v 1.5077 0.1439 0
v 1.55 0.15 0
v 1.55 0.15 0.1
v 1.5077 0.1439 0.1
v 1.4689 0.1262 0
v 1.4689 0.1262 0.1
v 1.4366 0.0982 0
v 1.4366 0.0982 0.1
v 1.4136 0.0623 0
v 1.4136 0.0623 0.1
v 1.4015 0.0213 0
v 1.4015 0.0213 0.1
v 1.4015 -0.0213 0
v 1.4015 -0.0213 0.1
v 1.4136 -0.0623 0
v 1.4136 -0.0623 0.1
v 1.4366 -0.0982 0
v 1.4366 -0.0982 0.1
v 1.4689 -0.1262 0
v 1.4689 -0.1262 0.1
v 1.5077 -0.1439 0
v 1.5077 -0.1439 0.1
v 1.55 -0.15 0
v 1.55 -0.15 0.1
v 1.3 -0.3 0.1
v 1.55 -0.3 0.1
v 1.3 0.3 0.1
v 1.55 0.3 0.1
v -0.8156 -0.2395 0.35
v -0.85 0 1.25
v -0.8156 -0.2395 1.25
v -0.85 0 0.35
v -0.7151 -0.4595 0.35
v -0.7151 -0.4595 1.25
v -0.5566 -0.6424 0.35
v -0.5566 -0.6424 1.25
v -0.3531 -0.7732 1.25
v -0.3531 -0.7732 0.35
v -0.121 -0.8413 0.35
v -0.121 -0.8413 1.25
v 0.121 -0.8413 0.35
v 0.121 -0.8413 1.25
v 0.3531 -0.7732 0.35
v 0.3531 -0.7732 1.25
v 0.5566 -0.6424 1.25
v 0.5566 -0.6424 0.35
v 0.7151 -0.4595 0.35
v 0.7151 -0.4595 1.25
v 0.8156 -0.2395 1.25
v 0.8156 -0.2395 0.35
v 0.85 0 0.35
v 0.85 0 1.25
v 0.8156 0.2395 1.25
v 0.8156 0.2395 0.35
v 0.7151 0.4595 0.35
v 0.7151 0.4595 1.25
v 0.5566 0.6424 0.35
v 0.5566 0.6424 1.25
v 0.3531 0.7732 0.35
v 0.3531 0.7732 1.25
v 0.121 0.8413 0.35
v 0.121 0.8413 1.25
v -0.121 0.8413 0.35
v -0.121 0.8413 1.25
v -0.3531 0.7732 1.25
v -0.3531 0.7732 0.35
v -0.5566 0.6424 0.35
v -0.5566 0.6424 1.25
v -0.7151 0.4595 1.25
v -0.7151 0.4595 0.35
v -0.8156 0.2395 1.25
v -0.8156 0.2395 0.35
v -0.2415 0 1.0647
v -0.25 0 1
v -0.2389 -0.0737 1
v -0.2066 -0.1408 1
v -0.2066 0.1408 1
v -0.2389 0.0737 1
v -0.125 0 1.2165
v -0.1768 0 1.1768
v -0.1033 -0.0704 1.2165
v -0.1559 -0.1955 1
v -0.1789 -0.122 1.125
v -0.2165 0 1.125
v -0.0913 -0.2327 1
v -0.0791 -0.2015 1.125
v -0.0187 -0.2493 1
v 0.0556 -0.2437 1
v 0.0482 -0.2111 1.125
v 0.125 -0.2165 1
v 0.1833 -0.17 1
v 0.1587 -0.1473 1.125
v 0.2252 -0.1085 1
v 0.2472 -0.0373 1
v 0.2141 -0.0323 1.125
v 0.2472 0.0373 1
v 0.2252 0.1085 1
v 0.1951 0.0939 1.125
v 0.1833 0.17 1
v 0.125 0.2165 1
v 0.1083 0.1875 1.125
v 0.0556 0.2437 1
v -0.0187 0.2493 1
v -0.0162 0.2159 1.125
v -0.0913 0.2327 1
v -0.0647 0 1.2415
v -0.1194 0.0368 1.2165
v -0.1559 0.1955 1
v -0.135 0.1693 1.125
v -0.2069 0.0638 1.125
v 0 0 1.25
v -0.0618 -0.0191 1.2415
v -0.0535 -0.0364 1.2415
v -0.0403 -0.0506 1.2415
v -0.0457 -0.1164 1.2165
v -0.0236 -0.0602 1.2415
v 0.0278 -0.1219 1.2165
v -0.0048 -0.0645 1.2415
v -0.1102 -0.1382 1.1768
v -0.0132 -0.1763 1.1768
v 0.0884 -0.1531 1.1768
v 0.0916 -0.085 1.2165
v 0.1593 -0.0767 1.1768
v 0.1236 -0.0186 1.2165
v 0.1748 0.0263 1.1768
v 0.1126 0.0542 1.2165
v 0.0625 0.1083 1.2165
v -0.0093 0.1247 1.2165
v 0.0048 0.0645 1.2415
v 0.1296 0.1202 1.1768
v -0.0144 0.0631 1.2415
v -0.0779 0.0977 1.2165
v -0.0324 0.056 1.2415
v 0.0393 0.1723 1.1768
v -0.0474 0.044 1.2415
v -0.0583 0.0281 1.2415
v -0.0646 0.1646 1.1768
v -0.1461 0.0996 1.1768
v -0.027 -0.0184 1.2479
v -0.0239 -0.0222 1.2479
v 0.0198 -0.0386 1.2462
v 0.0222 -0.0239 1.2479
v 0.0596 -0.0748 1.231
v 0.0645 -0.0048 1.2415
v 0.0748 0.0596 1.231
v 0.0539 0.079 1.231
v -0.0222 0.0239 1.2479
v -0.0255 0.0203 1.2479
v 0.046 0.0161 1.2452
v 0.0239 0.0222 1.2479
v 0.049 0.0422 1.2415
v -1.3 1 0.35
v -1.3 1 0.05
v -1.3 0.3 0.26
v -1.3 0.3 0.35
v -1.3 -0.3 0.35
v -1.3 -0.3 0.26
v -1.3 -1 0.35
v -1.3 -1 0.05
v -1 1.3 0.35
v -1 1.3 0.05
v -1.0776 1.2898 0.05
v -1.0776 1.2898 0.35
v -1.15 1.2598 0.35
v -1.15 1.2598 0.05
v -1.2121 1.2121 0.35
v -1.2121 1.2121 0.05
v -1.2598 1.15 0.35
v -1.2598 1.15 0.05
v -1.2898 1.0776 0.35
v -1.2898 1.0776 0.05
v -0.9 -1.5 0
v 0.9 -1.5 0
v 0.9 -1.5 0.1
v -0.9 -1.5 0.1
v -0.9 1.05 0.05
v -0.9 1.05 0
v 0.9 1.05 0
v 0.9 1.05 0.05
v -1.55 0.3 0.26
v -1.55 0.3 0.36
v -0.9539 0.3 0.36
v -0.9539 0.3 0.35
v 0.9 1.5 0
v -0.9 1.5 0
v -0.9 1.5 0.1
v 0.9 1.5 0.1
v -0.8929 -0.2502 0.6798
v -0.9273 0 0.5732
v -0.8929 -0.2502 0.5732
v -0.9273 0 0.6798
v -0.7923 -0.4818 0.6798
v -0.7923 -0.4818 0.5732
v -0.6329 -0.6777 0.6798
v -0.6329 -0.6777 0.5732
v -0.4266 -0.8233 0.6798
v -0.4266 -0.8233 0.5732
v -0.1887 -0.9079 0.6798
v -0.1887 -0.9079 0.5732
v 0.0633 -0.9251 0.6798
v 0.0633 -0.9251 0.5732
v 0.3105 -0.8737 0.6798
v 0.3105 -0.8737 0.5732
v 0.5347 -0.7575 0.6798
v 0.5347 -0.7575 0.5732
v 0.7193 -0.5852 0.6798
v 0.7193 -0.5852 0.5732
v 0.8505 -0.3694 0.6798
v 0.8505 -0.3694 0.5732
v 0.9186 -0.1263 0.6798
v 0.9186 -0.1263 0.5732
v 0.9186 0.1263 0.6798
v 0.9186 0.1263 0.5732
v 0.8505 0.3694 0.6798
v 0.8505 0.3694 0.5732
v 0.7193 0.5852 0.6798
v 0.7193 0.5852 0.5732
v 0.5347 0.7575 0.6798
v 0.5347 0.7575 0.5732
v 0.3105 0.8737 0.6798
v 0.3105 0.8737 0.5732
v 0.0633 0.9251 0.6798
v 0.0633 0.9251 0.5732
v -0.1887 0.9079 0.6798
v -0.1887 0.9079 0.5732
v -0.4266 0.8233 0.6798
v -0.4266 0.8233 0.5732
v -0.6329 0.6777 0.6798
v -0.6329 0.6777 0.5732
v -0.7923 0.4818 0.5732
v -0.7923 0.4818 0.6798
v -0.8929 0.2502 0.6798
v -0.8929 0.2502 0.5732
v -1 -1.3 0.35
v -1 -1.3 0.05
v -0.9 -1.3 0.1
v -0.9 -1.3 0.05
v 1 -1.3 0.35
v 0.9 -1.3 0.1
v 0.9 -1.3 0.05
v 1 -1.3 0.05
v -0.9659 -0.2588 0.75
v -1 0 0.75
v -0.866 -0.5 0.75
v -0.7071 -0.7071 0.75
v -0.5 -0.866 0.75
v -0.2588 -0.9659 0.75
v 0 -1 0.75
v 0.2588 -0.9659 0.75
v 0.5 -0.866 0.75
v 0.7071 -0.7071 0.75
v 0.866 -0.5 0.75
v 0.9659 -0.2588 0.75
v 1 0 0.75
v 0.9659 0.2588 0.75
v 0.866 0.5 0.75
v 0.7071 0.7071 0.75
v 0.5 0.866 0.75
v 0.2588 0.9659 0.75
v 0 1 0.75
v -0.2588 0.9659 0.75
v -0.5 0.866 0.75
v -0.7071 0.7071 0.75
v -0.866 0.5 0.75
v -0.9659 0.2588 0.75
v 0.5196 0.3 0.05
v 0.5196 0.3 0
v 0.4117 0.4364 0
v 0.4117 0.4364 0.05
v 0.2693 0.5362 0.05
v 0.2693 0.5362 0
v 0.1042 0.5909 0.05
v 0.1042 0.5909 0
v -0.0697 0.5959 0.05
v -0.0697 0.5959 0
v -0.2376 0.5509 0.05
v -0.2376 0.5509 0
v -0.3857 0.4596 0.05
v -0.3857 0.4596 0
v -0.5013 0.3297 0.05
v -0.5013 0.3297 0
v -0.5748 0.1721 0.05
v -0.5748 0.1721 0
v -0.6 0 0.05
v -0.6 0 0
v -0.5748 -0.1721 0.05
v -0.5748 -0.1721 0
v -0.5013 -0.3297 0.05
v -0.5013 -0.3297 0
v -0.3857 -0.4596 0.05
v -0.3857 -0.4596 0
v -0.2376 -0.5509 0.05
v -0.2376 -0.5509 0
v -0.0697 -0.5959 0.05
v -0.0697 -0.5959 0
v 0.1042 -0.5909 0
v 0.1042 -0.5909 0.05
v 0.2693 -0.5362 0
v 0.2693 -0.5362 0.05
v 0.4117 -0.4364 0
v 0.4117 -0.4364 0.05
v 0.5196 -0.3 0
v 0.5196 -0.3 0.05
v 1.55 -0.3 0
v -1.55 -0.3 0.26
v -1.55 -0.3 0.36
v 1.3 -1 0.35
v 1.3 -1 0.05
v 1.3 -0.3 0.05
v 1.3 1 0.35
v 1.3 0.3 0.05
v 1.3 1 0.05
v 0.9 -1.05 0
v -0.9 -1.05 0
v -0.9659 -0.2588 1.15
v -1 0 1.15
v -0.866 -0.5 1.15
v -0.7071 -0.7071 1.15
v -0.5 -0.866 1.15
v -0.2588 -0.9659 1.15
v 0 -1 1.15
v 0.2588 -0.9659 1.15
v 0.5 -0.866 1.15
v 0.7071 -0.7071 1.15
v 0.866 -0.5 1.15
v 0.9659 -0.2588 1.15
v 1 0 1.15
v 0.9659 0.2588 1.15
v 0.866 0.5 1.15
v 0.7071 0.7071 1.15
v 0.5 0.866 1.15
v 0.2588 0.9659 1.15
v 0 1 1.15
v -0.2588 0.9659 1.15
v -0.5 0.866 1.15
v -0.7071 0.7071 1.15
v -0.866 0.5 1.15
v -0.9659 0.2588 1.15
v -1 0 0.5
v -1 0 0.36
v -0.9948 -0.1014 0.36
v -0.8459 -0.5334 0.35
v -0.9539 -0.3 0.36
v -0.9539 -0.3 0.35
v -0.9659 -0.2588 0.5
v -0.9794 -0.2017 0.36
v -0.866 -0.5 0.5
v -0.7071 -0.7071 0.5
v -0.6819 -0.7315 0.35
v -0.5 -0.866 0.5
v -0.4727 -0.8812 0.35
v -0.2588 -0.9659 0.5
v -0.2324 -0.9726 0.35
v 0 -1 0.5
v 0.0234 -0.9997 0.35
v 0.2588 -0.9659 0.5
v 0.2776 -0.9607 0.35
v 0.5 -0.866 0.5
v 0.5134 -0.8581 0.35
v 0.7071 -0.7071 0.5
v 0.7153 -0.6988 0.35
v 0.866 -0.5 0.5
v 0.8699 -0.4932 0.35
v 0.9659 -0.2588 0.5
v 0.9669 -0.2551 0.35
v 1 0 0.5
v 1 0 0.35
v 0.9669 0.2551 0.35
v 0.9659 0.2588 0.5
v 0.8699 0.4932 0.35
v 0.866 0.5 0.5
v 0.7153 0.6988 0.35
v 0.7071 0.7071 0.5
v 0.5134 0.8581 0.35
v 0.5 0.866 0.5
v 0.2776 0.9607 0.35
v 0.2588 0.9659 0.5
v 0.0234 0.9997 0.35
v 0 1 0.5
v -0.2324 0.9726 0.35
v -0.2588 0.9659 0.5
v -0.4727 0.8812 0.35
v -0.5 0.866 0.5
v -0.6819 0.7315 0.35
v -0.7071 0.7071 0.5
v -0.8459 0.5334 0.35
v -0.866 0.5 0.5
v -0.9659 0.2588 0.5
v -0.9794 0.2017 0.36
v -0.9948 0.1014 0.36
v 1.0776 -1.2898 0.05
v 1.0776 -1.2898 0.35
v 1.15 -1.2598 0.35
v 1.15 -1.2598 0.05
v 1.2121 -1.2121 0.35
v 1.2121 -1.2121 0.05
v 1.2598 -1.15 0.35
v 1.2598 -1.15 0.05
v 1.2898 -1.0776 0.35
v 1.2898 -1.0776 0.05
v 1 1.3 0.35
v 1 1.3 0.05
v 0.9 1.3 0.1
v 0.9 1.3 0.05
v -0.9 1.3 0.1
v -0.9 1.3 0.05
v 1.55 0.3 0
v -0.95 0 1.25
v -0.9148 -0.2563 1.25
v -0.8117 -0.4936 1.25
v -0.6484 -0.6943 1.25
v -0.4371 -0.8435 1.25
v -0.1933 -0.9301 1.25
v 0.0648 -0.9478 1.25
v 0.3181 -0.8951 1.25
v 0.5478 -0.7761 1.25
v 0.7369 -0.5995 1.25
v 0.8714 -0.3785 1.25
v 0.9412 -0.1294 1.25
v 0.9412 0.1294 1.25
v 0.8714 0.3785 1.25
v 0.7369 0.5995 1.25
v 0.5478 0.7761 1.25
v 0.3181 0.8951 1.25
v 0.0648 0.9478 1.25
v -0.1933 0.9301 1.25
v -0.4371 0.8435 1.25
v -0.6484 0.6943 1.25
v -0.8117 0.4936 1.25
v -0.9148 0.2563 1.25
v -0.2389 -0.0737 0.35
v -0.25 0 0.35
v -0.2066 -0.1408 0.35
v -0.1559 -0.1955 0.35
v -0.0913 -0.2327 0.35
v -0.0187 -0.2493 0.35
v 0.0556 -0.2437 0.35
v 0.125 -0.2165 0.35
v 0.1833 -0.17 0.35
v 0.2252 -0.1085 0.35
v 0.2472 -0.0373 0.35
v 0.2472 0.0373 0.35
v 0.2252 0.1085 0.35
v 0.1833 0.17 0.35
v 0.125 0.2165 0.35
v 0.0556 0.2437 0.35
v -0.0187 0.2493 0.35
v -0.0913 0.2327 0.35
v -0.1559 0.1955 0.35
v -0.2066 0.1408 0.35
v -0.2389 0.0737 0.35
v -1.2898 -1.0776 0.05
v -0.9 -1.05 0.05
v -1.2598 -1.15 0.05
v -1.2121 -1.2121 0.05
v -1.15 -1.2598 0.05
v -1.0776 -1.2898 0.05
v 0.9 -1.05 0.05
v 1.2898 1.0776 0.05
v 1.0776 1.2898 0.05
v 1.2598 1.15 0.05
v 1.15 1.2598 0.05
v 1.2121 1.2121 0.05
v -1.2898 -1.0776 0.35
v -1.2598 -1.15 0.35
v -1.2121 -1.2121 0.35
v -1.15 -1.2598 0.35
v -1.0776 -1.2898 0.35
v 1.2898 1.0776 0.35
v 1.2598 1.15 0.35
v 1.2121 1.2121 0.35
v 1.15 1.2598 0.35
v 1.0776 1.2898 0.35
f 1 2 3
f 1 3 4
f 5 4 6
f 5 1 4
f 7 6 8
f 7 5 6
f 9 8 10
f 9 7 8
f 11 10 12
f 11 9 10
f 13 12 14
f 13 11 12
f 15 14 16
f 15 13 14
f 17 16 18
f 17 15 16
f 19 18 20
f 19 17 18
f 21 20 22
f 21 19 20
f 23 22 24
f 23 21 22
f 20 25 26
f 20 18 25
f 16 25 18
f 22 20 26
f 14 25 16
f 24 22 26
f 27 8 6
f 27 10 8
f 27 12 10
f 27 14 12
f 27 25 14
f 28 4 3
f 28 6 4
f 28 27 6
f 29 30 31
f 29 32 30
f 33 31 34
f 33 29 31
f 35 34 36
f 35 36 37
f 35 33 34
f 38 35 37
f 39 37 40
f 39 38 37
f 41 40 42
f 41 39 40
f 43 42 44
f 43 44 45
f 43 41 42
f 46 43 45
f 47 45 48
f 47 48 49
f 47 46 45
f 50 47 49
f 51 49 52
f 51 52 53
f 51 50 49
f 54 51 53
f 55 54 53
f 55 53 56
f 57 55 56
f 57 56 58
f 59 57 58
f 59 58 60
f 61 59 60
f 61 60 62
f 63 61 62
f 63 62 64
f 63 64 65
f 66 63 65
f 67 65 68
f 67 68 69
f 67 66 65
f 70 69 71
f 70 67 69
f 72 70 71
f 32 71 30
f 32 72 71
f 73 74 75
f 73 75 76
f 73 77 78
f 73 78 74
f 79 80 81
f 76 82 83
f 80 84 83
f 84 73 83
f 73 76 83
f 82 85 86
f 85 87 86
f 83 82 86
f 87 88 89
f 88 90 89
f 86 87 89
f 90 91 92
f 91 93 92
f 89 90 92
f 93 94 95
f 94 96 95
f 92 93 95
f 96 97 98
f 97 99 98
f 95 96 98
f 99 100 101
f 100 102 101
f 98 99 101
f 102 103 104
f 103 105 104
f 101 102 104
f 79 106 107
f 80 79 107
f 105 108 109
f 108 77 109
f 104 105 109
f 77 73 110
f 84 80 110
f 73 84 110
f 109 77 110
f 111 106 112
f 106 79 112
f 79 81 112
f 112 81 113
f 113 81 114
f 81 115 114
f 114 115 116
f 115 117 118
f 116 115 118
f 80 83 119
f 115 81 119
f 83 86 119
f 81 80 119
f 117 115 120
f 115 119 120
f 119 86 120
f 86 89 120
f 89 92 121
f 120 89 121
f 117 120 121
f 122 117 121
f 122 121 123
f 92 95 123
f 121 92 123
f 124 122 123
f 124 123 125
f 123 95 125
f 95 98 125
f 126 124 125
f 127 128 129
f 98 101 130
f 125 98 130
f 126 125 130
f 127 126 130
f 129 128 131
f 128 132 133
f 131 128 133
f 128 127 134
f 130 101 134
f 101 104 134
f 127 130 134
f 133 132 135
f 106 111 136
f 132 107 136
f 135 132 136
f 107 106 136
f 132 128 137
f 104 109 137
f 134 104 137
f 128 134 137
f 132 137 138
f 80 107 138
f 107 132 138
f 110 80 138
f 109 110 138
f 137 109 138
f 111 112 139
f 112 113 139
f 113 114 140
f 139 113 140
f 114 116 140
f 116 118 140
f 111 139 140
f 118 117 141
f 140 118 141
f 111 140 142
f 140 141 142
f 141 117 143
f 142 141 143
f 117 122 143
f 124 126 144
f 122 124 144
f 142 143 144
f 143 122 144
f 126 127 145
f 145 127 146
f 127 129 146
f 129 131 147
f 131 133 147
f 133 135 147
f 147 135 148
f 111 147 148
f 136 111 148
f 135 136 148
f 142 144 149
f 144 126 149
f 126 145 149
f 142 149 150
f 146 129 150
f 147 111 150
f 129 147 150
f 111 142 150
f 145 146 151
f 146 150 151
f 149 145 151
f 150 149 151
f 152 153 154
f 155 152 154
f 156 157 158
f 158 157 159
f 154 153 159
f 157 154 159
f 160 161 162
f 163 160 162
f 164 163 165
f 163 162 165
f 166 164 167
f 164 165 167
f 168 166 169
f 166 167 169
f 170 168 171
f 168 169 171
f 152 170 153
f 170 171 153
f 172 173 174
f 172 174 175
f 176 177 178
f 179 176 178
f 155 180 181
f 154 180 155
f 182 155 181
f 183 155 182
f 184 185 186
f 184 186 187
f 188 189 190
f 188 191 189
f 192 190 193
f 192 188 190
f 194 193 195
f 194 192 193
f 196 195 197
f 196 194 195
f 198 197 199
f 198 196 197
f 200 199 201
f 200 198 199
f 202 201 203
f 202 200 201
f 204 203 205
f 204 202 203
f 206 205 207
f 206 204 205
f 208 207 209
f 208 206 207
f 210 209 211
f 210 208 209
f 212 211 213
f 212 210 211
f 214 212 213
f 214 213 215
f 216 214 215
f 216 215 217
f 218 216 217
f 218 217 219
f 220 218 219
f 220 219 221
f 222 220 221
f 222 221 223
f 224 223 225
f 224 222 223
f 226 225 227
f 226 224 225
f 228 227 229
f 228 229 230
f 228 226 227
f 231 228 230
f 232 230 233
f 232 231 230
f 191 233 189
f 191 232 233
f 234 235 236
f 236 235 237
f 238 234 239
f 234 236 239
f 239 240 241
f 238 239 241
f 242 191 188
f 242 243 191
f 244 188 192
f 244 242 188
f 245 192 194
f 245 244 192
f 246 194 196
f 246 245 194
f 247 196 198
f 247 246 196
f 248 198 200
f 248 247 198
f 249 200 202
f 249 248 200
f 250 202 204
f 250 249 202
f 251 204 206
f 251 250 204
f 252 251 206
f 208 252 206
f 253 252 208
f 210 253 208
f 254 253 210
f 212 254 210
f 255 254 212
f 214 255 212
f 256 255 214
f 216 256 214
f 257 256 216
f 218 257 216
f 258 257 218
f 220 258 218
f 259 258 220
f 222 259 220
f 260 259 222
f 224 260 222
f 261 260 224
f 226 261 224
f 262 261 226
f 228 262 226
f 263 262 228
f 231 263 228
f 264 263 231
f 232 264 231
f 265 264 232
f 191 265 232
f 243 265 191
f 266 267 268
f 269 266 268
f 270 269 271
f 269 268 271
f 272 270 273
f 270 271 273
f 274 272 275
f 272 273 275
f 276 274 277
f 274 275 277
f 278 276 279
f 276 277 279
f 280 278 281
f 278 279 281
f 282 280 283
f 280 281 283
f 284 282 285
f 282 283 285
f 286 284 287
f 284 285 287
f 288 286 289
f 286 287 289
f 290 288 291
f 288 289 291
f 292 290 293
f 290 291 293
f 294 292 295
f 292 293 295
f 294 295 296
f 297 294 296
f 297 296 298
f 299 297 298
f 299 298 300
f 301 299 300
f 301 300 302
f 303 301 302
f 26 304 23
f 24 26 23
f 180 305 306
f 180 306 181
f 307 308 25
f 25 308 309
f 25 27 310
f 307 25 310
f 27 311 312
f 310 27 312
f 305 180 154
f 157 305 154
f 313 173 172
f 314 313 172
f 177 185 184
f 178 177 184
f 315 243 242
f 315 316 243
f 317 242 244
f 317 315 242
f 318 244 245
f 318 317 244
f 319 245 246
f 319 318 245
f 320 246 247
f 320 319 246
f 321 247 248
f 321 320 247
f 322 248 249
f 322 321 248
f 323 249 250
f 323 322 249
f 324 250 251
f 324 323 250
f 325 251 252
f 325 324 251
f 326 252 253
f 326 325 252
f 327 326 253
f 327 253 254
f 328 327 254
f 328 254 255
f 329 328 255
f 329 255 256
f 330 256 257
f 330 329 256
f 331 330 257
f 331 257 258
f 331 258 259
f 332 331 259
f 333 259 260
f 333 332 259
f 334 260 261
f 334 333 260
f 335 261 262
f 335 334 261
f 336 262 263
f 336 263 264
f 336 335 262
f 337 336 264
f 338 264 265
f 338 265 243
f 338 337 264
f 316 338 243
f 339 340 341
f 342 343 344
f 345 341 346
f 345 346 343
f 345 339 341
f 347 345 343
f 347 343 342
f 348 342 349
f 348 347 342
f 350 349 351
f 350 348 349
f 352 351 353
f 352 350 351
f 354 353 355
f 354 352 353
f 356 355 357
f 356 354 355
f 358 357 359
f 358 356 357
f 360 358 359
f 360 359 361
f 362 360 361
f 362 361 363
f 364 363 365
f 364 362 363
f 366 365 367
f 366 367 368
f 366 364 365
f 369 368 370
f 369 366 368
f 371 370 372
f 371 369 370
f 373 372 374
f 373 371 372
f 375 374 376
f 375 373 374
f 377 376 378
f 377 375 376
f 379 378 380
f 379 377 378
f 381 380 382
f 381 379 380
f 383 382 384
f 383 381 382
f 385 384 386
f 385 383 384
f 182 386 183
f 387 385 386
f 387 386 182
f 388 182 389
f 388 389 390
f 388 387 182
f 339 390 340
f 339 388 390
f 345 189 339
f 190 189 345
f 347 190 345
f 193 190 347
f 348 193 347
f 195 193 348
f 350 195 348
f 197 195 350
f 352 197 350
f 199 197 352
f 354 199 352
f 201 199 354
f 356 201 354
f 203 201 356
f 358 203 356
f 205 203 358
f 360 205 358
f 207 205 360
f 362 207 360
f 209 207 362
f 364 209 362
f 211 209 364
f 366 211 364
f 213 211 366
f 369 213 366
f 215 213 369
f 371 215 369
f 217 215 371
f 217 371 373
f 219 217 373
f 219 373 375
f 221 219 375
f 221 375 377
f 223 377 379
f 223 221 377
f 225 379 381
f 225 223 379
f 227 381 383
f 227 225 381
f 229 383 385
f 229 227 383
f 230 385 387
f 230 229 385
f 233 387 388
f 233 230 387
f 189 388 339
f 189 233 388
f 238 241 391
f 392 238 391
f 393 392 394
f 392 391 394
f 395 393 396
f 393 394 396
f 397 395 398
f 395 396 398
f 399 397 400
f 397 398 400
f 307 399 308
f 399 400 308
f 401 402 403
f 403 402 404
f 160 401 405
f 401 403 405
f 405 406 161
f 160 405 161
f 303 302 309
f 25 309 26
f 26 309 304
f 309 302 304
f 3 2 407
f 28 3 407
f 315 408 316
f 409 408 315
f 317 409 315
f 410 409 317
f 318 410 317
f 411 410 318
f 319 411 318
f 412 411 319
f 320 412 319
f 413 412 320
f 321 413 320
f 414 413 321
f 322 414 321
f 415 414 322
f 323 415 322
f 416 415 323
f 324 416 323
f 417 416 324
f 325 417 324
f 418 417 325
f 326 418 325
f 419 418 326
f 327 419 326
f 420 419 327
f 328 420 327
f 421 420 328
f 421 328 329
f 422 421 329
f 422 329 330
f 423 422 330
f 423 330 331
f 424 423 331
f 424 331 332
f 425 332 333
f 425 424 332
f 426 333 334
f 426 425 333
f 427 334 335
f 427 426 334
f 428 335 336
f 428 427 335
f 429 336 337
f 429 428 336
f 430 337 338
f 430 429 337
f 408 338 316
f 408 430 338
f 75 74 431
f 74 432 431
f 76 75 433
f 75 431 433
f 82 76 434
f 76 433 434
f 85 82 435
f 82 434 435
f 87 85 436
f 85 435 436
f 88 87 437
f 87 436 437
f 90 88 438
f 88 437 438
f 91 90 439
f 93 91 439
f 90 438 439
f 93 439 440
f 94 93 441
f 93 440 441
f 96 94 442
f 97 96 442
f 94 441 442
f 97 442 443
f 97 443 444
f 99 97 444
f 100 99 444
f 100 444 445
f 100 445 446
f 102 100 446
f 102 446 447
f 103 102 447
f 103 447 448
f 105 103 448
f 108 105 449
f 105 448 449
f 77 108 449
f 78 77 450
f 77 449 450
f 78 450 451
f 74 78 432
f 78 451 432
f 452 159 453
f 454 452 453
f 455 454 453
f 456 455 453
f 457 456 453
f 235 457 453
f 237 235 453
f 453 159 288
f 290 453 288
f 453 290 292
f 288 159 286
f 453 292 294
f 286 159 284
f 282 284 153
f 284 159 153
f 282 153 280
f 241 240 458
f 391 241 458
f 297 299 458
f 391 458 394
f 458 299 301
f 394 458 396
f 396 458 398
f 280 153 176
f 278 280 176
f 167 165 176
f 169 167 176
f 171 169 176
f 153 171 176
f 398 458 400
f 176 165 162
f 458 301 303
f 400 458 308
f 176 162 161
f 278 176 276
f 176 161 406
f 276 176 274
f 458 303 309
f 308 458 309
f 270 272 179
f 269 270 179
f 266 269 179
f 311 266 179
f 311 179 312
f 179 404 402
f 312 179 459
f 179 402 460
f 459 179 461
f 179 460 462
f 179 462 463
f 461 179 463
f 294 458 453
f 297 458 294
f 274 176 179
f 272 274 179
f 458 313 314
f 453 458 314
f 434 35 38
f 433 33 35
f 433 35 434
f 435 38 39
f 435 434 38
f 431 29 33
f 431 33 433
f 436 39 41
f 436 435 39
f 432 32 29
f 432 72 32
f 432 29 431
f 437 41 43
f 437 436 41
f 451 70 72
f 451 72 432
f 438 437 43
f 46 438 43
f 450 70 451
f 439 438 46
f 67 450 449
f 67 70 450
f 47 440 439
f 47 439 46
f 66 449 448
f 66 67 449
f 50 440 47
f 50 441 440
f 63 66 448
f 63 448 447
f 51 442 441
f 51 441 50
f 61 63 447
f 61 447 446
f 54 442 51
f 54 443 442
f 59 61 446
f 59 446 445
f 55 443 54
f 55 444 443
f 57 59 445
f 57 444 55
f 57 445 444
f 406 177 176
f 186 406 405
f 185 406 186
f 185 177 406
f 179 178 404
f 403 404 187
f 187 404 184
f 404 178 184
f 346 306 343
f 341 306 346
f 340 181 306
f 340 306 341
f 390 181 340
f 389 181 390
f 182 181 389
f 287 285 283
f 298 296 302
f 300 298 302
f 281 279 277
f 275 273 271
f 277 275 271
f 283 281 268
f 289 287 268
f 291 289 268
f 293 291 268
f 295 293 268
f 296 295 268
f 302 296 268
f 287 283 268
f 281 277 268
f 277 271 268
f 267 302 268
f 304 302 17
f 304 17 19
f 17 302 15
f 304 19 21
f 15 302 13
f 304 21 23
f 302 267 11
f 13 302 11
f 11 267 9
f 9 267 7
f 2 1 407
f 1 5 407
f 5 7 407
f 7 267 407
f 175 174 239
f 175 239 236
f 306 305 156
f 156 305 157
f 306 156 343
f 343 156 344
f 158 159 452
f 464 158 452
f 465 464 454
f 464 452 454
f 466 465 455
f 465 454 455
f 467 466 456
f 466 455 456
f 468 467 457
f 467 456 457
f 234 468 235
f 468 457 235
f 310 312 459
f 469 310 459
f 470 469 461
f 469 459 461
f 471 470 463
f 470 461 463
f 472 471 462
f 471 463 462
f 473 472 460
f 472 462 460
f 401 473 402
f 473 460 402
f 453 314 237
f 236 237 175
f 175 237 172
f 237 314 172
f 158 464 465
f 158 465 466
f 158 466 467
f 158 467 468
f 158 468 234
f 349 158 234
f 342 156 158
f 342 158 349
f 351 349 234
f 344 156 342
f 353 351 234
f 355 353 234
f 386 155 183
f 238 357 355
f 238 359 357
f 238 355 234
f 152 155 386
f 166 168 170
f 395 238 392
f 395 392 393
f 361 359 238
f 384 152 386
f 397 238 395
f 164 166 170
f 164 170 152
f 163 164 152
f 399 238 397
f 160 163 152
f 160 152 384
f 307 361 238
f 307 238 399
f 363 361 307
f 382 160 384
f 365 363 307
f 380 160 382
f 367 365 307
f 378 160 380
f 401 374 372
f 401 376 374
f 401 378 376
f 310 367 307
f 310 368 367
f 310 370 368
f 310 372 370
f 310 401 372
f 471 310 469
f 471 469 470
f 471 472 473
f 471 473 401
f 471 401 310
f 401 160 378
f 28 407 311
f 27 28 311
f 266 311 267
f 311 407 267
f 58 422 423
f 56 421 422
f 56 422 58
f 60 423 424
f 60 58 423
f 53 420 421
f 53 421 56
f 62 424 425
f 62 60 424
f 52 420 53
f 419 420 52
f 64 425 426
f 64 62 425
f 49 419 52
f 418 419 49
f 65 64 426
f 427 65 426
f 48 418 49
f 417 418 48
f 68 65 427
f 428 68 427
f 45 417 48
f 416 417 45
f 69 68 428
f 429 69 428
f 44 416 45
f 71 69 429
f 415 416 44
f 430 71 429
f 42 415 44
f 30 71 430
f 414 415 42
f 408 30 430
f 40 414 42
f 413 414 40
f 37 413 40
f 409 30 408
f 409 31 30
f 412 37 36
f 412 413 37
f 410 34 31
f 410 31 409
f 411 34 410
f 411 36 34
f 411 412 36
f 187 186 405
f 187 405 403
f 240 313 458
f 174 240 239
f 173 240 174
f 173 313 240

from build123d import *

# Parameters (mm, degrees)
BOX001_W     = 0.66
BOX001_H     = 0.6
BOX001_DEPTH = 0.1
PAD001_DEPTH = 0.1
BOX_W        = 1.8
BOX_H        = 0.45
BOX_DEPTH    = 0.1
ARRAY_COUNT  = 2
PAD_DEPTH    = 0.3


with BuildPart() as revolution001:
    # Sketch002 → Revolution001 (revolve)
    with BuildSketch(Plane.XZ):
        with BuildLine():
            Line((-0.25, 0.35), (0, 0.35))
            Line((0, 0.35), (0, 1.25))
            ThreePointArc((0, 1.25), (-0.176777, 1.176777), (-0.25, 1))
            Line((-0.25, 1), (-0.25, 0.35))
        make_face()
    revolve(axis=Axis((0, 0, 0), (0, 0, 1)))


with BuildPart() as revolution:
    # Sketch001 → Revolution (revolve)
    with BuildSketch(Plane.XZ):
        Polygon((-1, 0.35), (-1, 0.5), (-0.927252, 0.573186), (-0.927252, 0.679793), (-1, 0.75), (-1, 1.15), (-0.95, 1.25), (-0.85, 1.25), (-0.85, 0.35), align=None)
    revolve(axis=Axis((0, 0, 0), (0, 0, 1)))


with BuildPart() as ground_pin2:
    # Box001 → Box001 (new body)
    with BuildSketch(Plane(origin=(-1.55, -0.3, 0.26), x_dir=(1, 0, 0), z_dir=(0, 0, 1))):
        with Locations((0.33, 0.3)):
            Rectangle(BOX001_W, BOX001_H)
    extrude(amount=BOX001_DEPTH)


with BuildPart() as signal_pin:
    # Sketch003 → Pad001 (new body)
    with BuildSketch(Plane.XY):
        with BuildLine():
            Line((1.55, 0.3), (0.519615, 0.3))
            ThreePointArc((0.519615, 0.3), (-0.6, 0), (0.519615, -0.3))
            Line((0.519615, -0.3), (1.55, -0.3))
            Line((1.55, -0.3), (1.55, -0.15))
            ThreePointArc((1.55, 0.15), (1.4, 0), (1.55, -0.15))
            Line((1.55, 0.15), (1.55, 0.3))
        make_face()
    extrude(amount=PAD001_DEPTH)


with BuildPart() as ground_pins:
    # Box → Box (new body)
    with BuildSketch(Plane(origin=(-0.9, 1.05, 0), x_dir=(1, 0, 0), z_dir=(0, 0, 1))):
        with Locations((0.9, 0.225)):
            Rectangle(BOX_W, BOX_H)
    extrude(amount=BOX_DEPTH)

    # Array: ground_pins ×2 about axis
    array_axis = Axis((0, 0, 0), (0, 0, 1))


with BuildPart() as ground_pins_1:
    add(ground_pins.part)
    for i in range(1, ARRAY_COUNT):
        add(ground_pins.part.rotate(array_axis, i * 360 / ARRAY_COUNT))


with BuildPart() as fusion:
    # Sketch → Pad (new body)
    with BuildSketch(Plane.XY.offset(0.05)):
        with BuildLine():
            Line((-1, -1.3), (1, -1.3))
            ThreePointArc((1, -1.3), (1.212132, -1.212132), (1.3, -1))
            Line((1.3, -1), (1.3, 1))
            ThreePointArc((1.3, 1), (1.212132, 1.212132), (1, 1.3))
            Line((1, 1.3), (-1, 1.3))
            ThreePointArc((-1, 1.3), (-1.212132, 1.212132), (-1.3, 1))
            Line((-1.3, 1), (-1.3, -1))
            ThreePointArc((-1.3, -1), (-1.212132, -1.212132), (-1, -1.3))
        make_face()
    extrude(amount=PAD_DEPTH)

    # Fusion: union Revolution001, Revolution, ground_pin2, signal_pin, ground_pins
    add(revolution001.part)
    add(revolution.part)
    add(ground_pin2.part)
    add(signal_pin.part)
    add(ground_pins_1.part)


solid = fusion.part
